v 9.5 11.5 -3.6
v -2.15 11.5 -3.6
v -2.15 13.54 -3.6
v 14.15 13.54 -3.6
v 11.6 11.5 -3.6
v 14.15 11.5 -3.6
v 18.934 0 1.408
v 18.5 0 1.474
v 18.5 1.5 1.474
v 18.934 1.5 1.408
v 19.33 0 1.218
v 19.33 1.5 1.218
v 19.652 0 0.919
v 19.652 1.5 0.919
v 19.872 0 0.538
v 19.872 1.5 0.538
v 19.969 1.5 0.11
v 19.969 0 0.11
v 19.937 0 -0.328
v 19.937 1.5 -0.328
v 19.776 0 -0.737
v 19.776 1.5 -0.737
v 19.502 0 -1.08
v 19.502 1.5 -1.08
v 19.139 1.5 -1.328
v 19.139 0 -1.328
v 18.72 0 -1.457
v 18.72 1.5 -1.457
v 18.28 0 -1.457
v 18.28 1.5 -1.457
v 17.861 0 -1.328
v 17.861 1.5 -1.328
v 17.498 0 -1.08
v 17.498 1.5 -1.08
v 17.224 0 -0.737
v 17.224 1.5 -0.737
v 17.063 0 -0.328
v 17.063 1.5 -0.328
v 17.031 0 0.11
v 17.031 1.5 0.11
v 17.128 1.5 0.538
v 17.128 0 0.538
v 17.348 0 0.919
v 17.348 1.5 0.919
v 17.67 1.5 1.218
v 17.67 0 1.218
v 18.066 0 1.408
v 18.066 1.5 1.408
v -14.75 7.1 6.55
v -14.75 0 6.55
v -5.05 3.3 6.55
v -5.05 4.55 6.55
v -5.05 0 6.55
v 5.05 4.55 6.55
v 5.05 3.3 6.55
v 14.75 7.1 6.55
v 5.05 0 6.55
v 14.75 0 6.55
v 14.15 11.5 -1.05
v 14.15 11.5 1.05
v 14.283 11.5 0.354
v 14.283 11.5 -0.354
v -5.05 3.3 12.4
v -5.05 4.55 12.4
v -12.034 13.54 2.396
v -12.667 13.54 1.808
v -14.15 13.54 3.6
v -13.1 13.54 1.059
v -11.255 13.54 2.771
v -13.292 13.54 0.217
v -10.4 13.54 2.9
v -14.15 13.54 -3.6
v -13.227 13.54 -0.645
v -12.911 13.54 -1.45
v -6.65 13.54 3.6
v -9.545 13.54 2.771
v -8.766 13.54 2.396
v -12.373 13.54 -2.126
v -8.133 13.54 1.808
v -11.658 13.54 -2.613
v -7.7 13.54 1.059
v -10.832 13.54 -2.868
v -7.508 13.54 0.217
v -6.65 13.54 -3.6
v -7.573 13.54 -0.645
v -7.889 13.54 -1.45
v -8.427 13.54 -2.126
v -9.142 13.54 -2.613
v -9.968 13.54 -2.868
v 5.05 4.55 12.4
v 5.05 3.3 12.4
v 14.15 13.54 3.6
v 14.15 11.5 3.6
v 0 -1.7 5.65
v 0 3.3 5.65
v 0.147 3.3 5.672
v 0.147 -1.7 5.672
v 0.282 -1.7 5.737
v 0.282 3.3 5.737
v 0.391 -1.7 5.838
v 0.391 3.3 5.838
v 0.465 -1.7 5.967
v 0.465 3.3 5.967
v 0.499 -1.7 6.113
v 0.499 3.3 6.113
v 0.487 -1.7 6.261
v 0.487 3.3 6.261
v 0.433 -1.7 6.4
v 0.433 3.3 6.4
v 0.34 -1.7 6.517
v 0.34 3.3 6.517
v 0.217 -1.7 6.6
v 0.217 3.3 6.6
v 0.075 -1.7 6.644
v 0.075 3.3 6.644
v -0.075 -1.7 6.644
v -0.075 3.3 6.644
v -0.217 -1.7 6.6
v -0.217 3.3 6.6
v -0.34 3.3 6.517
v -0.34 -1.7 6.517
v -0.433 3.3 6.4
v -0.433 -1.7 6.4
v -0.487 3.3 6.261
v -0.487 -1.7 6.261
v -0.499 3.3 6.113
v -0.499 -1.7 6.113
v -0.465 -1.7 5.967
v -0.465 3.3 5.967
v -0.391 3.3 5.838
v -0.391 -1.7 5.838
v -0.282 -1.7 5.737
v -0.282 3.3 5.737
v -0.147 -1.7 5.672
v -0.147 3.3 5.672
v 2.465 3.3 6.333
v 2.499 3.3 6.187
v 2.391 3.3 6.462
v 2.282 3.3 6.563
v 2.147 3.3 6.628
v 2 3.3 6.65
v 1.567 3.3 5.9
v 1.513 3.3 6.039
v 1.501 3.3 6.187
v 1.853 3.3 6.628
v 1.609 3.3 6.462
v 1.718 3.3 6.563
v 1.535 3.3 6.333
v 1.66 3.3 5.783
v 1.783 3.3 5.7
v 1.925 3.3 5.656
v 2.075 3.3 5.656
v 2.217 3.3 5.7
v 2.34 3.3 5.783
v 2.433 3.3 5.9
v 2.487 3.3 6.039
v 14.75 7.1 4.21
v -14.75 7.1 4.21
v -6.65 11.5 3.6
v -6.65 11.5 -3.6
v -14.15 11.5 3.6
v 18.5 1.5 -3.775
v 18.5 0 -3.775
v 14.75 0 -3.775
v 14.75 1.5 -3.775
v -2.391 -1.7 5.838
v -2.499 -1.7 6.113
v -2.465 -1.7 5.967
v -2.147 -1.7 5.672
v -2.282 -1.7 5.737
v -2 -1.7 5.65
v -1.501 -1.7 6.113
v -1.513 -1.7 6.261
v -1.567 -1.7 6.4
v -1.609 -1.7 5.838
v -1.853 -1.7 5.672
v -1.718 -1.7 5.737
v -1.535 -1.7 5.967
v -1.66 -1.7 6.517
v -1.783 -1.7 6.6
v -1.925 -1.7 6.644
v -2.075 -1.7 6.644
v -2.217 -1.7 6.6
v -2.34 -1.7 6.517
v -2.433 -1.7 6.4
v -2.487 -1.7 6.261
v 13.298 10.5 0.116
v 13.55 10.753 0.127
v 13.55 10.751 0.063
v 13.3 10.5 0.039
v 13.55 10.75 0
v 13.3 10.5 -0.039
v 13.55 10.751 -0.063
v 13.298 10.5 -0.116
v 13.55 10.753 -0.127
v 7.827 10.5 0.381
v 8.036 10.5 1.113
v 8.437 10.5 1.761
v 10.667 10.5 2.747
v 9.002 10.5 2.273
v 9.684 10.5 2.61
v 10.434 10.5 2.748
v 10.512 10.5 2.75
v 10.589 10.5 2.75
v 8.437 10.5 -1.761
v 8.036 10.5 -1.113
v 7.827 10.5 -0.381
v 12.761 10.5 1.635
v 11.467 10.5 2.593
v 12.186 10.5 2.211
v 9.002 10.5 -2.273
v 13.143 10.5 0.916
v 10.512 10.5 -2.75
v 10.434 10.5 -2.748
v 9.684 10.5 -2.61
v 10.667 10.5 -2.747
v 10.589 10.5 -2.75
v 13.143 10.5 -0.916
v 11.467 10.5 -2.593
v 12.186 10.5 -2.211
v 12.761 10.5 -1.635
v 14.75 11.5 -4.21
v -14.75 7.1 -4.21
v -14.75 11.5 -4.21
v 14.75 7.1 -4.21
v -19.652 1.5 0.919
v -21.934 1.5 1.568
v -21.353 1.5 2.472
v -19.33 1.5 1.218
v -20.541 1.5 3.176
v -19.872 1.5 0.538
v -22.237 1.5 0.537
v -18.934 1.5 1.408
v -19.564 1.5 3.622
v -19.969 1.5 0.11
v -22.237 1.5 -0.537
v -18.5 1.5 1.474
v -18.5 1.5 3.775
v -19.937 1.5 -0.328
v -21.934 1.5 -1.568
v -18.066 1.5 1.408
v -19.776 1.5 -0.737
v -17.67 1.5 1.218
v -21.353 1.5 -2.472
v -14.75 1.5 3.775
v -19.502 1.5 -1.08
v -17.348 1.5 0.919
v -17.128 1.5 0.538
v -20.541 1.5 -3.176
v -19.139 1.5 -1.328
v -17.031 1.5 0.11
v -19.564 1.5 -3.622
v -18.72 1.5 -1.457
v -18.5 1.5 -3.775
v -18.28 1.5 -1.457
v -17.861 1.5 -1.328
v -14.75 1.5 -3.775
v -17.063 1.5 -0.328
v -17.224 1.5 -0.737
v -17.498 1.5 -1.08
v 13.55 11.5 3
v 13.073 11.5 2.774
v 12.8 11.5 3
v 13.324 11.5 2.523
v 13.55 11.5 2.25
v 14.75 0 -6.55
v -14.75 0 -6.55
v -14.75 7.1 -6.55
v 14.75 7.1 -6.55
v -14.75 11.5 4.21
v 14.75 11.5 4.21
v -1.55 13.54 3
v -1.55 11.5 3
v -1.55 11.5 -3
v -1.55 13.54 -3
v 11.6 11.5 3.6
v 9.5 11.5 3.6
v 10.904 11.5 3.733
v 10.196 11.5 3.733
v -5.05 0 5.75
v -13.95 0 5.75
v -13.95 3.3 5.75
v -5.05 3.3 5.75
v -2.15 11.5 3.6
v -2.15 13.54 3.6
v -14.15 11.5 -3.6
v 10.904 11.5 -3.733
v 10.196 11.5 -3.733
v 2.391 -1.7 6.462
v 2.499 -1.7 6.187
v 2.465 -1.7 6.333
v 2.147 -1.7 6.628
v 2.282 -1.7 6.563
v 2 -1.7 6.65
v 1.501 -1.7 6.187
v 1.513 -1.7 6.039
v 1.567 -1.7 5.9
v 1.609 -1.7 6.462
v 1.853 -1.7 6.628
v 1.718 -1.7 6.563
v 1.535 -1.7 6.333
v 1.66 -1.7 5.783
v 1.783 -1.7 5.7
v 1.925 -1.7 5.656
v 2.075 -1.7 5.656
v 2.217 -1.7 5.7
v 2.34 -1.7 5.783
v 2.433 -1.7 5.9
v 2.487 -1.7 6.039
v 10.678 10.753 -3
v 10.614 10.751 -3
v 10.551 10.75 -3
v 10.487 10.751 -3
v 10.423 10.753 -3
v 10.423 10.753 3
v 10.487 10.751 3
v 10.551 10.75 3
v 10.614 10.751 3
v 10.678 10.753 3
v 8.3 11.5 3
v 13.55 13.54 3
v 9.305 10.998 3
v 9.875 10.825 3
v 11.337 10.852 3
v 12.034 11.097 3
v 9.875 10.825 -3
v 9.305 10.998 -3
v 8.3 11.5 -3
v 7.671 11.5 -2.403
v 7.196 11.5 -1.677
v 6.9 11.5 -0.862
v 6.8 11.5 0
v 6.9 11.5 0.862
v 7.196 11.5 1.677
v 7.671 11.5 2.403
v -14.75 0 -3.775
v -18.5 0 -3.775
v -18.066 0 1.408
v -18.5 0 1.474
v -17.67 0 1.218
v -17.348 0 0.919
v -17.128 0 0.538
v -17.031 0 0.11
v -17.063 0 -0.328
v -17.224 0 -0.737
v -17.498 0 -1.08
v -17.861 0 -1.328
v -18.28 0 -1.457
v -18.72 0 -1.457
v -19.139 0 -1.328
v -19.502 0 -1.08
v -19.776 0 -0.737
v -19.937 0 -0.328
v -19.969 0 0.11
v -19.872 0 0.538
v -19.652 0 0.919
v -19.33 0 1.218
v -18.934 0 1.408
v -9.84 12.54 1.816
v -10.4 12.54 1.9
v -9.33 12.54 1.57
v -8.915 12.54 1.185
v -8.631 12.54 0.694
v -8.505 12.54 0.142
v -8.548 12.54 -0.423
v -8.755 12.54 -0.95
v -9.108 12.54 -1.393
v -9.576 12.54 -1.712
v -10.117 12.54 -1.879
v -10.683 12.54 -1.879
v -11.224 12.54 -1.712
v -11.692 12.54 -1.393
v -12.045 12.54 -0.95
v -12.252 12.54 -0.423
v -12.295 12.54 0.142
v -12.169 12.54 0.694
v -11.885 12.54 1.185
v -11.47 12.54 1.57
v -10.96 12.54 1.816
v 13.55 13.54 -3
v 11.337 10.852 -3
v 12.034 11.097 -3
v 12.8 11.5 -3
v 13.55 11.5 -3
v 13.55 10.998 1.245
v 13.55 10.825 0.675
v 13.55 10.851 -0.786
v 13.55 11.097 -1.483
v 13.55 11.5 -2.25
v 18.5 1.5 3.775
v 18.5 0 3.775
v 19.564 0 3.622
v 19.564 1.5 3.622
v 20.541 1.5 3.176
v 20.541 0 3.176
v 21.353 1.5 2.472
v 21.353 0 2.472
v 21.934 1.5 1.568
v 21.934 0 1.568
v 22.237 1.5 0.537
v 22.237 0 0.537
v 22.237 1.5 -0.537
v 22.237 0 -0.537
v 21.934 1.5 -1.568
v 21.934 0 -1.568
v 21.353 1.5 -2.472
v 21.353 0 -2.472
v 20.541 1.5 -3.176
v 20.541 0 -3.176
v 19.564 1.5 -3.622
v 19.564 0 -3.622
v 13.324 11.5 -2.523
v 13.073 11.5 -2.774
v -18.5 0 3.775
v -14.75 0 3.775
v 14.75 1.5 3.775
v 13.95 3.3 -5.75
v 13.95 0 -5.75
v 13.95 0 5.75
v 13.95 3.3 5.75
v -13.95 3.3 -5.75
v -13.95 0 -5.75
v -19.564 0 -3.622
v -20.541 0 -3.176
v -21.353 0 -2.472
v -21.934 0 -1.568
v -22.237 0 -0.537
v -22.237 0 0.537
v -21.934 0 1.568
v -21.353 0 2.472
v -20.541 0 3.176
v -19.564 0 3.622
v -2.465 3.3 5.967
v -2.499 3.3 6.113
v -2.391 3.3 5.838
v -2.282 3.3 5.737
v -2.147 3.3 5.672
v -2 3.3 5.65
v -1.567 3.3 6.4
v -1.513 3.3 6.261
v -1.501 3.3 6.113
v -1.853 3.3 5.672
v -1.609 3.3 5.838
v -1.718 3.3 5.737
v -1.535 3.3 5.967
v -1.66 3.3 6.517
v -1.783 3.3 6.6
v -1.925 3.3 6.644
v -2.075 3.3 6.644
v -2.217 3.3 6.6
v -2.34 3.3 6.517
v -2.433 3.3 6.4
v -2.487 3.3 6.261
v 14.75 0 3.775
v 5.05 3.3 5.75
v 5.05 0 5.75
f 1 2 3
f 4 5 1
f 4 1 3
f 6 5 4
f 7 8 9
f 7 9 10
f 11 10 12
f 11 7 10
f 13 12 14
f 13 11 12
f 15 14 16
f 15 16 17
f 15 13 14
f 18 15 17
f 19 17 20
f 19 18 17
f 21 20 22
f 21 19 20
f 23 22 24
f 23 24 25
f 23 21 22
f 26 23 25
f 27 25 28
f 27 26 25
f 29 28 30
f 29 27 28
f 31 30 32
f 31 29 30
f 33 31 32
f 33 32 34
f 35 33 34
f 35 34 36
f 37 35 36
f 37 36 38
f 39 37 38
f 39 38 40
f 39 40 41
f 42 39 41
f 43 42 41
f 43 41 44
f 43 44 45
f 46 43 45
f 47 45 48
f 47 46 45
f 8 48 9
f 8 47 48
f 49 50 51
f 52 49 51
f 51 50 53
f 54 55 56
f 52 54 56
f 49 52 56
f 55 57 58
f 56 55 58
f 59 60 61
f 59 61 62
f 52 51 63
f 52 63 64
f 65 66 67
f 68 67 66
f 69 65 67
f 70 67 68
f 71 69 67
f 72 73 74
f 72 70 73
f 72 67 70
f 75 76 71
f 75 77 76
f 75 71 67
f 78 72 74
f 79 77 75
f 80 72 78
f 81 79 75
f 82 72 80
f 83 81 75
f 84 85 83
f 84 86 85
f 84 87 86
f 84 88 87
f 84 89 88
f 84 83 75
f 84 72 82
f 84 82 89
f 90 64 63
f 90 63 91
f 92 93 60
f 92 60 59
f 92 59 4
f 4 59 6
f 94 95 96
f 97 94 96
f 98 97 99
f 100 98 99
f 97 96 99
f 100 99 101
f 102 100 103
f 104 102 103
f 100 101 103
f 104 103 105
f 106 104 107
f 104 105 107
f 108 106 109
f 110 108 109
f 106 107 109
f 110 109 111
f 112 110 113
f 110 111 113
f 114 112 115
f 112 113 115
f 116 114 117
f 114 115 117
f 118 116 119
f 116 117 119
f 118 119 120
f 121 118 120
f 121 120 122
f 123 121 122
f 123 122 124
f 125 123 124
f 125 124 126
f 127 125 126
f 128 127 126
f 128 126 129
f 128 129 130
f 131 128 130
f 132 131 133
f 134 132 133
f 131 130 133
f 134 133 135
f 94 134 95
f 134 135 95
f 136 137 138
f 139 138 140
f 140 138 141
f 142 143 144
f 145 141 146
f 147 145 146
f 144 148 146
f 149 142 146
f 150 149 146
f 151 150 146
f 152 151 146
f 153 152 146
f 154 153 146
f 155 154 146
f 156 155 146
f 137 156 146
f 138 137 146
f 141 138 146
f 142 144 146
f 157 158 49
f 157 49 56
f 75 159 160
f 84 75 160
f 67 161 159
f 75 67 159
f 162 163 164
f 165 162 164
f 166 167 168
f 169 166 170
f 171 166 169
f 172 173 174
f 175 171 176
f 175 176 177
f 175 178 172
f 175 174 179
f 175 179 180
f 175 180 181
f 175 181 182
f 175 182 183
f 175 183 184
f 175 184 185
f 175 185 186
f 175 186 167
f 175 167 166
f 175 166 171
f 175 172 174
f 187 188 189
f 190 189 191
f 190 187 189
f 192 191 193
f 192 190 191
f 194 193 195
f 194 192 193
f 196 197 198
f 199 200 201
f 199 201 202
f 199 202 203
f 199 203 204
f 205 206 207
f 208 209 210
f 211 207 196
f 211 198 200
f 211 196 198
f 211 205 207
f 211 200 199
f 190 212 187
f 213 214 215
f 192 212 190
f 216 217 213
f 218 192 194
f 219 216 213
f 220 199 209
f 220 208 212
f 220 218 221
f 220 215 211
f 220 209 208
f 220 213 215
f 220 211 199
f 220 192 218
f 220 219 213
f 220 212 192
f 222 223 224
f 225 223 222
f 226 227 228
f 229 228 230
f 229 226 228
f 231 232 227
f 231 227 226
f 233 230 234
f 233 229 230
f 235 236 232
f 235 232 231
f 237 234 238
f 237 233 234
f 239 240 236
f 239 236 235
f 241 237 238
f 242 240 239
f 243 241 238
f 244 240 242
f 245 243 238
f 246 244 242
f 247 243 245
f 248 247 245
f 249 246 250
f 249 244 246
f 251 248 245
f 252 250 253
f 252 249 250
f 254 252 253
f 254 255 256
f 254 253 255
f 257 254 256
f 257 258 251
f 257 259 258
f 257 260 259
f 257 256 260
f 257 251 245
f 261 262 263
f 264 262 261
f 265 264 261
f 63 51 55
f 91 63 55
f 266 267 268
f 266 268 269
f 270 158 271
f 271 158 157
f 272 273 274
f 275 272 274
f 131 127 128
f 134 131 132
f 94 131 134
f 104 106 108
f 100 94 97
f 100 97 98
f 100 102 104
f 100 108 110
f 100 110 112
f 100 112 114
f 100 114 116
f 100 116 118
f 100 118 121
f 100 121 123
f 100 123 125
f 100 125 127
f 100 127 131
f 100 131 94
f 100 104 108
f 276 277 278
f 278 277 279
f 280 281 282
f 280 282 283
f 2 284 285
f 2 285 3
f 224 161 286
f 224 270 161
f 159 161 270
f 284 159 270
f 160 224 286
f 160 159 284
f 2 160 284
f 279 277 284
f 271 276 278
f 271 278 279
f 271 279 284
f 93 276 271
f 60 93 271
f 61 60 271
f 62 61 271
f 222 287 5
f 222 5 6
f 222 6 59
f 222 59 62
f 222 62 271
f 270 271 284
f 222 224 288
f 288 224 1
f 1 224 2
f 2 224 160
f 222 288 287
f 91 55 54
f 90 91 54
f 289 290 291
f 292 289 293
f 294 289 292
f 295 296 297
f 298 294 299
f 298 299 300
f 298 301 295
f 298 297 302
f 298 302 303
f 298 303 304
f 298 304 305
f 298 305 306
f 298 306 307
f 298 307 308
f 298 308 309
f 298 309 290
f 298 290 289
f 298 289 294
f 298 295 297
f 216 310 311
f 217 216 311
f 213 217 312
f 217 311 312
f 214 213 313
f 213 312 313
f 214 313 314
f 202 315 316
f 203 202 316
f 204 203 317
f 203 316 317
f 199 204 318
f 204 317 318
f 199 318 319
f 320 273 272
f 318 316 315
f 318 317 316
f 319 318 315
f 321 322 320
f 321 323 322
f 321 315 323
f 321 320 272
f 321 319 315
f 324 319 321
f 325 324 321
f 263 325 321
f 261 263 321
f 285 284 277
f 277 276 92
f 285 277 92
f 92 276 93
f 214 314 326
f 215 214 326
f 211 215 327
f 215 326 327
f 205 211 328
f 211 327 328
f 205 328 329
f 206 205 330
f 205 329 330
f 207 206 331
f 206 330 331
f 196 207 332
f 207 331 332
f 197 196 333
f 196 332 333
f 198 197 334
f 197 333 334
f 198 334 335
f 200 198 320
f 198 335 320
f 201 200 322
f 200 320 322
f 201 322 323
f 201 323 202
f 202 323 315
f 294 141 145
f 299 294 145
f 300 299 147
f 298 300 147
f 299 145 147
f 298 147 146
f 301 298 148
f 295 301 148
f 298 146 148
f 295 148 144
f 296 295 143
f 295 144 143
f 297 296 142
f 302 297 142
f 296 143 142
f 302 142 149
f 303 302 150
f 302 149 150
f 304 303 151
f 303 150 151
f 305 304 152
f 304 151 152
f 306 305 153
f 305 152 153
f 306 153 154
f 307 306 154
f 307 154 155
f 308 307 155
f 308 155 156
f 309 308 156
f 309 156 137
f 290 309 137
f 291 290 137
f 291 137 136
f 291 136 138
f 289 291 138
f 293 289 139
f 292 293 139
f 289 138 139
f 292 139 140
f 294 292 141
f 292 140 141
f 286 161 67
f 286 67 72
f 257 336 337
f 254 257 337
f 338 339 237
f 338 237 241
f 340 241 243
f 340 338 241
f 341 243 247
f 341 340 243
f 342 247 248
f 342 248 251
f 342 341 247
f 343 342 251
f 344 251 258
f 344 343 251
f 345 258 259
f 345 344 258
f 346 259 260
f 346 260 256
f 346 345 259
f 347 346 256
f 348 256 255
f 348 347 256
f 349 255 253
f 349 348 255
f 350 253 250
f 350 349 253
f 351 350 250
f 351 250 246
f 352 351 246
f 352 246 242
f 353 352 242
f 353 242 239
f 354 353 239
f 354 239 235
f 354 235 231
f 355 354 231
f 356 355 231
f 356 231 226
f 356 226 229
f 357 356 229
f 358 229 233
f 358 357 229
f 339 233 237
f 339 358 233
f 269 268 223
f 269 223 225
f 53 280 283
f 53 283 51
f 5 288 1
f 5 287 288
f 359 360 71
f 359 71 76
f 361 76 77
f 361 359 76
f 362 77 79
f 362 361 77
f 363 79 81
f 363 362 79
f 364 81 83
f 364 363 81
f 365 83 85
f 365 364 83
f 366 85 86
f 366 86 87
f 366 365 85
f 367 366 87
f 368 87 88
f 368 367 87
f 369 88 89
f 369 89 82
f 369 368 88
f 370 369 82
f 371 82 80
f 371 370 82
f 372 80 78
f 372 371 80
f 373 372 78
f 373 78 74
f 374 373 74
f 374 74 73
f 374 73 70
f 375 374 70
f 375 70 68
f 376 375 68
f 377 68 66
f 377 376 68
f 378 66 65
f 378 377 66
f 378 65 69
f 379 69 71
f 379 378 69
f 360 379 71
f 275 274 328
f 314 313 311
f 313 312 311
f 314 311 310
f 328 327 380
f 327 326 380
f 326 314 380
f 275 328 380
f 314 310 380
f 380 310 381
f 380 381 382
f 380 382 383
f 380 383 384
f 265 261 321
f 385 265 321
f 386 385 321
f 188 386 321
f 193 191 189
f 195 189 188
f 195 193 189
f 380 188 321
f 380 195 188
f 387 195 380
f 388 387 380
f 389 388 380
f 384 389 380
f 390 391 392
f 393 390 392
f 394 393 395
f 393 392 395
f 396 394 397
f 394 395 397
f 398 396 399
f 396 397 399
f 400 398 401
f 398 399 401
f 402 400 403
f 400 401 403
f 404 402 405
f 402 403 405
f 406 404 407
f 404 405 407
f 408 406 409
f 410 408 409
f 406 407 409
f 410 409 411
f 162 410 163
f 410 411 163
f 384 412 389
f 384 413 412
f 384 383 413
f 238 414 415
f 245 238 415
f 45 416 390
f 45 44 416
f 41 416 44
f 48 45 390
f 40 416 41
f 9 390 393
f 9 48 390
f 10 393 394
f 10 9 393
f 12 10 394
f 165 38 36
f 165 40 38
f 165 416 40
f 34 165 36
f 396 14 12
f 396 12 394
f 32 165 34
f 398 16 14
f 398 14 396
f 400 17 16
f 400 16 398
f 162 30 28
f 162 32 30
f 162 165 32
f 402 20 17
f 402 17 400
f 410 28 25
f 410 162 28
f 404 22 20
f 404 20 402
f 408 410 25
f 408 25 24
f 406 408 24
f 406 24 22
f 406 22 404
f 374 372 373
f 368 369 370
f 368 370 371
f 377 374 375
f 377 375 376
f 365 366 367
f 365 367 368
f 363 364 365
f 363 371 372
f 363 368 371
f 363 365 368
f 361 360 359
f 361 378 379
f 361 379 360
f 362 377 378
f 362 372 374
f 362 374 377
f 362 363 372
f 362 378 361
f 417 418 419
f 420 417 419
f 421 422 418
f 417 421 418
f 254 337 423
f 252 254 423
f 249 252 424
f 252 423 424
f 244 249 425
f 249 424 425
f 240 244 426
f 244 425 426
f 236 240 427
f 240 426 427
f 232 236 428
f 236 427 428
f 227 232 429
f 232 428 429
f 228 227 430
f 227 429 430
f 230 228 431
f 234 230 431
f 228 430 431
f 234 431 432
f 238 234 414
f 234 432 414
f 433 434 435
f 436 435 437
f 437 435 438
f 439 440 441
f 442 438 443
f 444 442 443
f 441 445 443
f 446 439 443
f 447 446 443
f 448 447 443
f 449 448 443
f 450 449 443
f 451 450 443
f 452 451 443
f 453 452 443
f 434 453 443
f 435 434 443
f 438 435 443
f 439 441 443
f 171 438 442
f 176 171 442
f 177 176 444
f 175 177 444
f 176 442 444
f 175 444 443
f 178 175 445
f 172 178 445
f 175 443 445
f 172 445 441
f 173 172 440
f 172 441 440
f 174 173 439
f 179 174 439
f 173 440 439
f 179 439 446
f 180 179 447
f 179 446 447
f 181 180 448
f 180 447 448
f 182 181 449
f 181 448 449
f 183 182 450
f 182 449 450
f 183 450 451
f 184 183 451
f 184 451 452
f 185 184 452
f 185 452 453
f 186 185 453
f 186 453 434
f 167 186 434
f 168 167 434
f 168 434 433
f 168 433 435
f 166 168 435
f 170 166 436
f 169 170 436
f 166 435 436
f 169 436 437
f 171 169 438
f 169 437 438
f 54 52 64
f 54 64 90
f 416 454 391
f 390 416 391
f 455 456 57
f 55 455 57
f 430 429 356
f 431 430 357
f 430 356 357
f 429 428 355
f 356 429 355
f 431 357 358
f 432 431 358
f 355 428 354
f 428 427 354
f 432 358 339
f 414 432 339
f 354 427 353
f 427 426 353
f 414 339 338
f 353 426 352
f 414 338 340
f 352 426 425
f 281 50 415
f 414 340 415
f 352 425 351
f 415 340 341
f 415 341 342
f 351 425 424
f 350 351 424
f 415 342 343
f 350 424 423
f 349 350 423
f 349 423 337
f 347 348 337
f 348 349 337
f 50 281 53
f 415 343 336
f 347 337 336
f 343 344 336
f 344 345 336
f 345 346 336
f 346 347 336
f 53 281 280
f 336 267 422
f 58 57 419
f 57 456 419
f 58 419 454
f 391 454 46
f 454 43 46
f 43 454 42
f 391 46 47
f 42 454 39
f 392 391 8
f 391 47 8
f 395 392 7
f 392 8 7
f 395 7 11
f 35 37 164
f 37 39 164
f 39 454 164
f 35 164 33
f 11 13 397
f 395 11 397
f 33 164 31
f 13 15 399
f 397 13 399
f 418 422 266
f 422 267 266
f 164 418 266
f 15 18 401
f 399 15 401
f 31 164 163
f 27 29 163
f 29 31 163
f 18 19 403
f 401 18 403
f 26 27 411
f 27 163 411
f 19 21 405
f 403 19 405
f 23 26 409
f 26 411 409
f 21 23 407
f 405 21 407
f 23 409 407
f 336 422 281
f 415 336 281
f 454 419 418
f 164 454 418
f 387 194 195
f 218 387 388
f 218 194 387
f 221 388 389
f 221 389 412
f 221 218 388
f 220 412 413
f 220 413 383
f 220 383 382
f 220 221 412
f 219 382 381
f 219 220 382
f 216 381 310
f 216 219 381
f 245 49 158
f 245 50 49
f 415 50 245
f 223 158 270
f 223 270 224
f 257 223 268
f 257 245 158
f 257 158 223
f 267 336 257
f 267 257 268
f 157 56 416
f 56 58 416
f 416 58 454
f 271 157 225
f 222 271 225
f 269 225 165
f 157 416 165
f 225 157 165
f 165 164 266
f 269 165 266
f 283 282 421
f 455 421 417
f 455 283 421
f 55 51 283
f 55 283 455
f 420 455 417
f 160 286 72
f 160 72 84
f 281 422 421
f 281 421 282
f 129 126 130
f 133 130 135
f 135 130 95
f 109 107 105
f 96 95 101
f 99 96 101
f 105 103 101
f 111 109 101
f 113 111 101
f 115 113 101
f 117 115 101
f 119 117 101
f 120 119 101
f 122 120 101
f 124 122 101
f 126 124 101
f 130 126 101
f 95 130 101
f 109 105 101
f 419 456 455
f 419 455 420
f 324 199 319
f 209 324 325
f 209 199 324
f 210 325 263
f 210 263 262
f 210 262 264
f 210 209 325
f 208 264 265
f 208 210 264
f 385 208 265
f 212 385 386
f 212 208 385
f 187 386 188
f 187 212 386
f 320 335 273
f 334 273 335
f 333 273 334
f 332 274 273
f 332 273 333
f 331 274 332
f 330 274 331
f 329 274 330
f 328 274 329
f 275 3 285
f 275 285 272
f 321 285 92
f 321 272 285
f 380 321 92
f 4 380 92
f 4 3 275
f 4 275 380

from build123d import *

# Parameters (mm, degrees)
SKETCH1_R             = 1.473596517
BOSS_EXTRUDE1_DEPTH   = 1.5
SKETCH2_W             = 29.5
SKETCH2_H             = 13.1
BOSS_EXTRUDE2_DEPTH   = 5.6
SKETCH3_W             = 29.5
SKETCH3_H             = 8.42
BOSS_EXTRUDE3_DEPTH   = 4.4
SKETCH4_W             = 7.5
SKETCH4_H             = 7.2
SKETCH4_W_2           = 16.3
SKETCH4_W_3           = 15.1
SKETCH4_H_2           = 6
BOSS_EXTRUDE4_DEPTH   = 2.04
SKETCH5_R             = 2.9
CUT_EXTRUDE1_DEPTH    = 1
CUT_EXTRUDE2_DEPTH    = 1
CHAMFER1_SIZE         = 1
SKETCH7_W             = 10.1
SKETCH7_H             = 1.25
BOSS_EXTRUDE5_DEPTH   = 5.85
SKETCH8_W             = 27.9
SKETCH8_H             = 11.5
SKETCH8_W_2           = 10.1
SKETCH8_H_2           = 0.8
CUT_EXTRUDE3_DEPTH    = 3.3
SKETCH9_R             = 0.5
BOSS_EXTRUDE6_DEPTH   = 5
BOSS_EXTRUDE6_2_DEPTH = 5
BOSS_EXTRUDE6_3_DEPTH = 5


with BuildPart() as part:
    # Sketch1 → Boss-Extrude1 (new body)
    with BuildSketch(Plane(origin=(0, 0, 0), x_dir=(1, 0, 0), z_dir=(0, 1, 0))):
        with BuildLine():
            Line((14.75, -6.55), (14.75, -3.775))
            Line((14.75, -3.775), (18.5, -3.775))
            ThreePointArc((18.5, -3.775), (22.275, 0), (18.5, 3.775))
            Line((18.5, 3.775), (14.75, 3.775))
            Line((14.75, 3.775), (14.75, 6.55))
            Line((14.75, 6.55), (-14.75, 6.55))
            Line((-14.75, 6.55), (-14.75, 3.775))
            Line((-14.75, 3.775), (-18.5, 3.775))
            ThreePointArc((-18.5, 3.775), (-22.275, 0), (-18.5, -3.775))
            Line((-18.5, -3.775), (-14.75, -3.775))
            Line((-14.75, -3.775), (-14.75, -6.55))
            Line((-14.75, -6.55), (14.75, -6.55))
        make_face()
        with Locations(Location((-18.5, 0, 0), (0, 0, 270))):
            Circle(SKETCH1_R, mode=Mode.SUBTRACT)
        with Locations(Location((18.5, 0, 0), (0, 0, 270))):
            Circle(SKETCH1_R, mode=Mode.SUBTRACT)
    extrude(amount=BOSS_EXTRUDE1_DEPTH)

    # Sketch2 → Boss-Extrude2 (add)
    with BuildSketch(Plane(origin=(0, 1.5, 0), x_dir=(1, 0, 0), z_dir=(0, 1, 0))):
        Rectangle(SKETCH2_W, SKETCH2_H)
    extrude(amount=BOSS_EXTRUDE2_DEPTH)

    # Sketch3 → Boss-Extrude3 (add)
    with BuildSketch(Plane(origin=(0, 7.1, 0), x_dir=(1, 0, 0), z_dir=(0, 1, 0))):
        Rectangle(SKETCH3_W, SKETCH3_H)
    extrude(amount=BOSS_EXTRUDE3_DEPTH)

    # Sketch4 → Boss-Extrude4 (add)
    # profile 1 of 2: a face of its own
    with BuildSketch(Plane(origin=(0, 11.5, 0), x_dir=(1, 0, 0), z_dir=(0, 1, 0))):
        with Locations((-10.4, 0)):
            Rectangle(SKETCH4_W, SKETCH4_H)
    # profile 2 of 2: a face of its own
    with BuildSketch(Plane(origin=(0, 11.5, 0), x_dir=(1, 0, 0), z_dir=(0, 1, 0))):
        with Locations((6, 0)):
            Rectangle(SKETCH4_W_2, SKETCH4_H)
        with Locations((6, 0)):
            Rectangle(SKETCH4_W_3, SKETCH4_H_2, mode=Mode.SUBTRACT)
    extrude(amount=BOSS_EXTRUDE4_DEPTH)

    # Sketch5 → Cut-Extrude1 (cut)
    with BuildSketch(Plane(origin=(0, 13.54, 0), x_dir=(1, 0, 0), z_dir=(0, 1, 0))):
        with Locations(Location((-10.4, 0, 0), (0, 0, 270))):
            Circle(SKETCH5_R)
    extrude(amount=-CUT_EXTRUDE1_DEPTH, mode=Mode.SUBTRACT)

    # Sketch6 → Cut-Extrude2 (cut)
    with BuildSketch(Plane(origin=(0, 11.5, 0), x_dir=(1, 0, 0), z_dir=(0, 1, 0))):
        with BuildLine():
            ThreePointArc((8.3, 3), (7.195898034, 1.677050983), (6.8, 0))
            Line((6.8, 0), (13.55, 0))
            Line((13.55, 0), (13.55, 2.25))
            ThreePointArc((13.55, 2.25), (13.201650429, 2.651650429), (12.8, 3))
            Line((12.8, 3), (8.3, 3))
        make_face()
        with BuildLine():
            Line((13.55, 0), (6.8, 0))
            ThreePointArc((6.8, 0), (7.195898034, -1.677050983), (8.3, -3))
            Line((8.3, -3), (12.8, -3))
            ThreePointArc((12.8, -3), (13.201650429, -2.651650429), (13.55, -2.25))
            Line((13.55, -2.25), (13.55, 0))
        make_face()
    extrude(amount=-CUT_EXTRUDE2_DEPTH, mode=Mode.SUBTRACT)

    # Chamfer1
    # the kernel refuses this chamfer: 1 mm, written as the material it adds along each edge
    with BuildSketch(Plane(origin=(-10.4, 12.54, 0), x_dir=(0, 0, 1), z_dir=(-1, 0, 0))) as chamfer1_piece_1_section:
        Polygon((2.9, CHAMFER1_SIZE), (2.9 - CHAMFER1_SIZE, 0), (2.9, 0), align=None)
    chamfer1_piece_1 = revolve(axis=Axis((-10.4, 12.54, 0), (0, 1, 0)), mode=Mode.PRIVATE)
    chamfer1_piece_1 = split(chamfer1_piece_1, bisect_by=Plane(origin=(-10.4, 13.54, -2.40049425), z_dir=(0, -1, 0)), keep=Keep.TOP, mode=Mode.PRIVATE)
    add(chamfer1_piece_1)
    with BuildSketch(Plane(origin=(10.55, 10.5, 0), x_dir=(0.04265214044718796, 0, -0.9990899833925238), z_dir=(0.9990899833925238, 0, 0.04265214044718796))) as chamfer1_piece_2_section:
        Polygon((3.75 - CHAMFER1_SIZE, 0), (3.75, CHAMFER1_SIZE), (3.75, 0), align=None)
    chamfer1_piece_2 = revolve(axis=Axis((10.55, 10.5, 0), (0, 1, 0)), revolution_arc=184.889058401, mode=Mode.PRIVATE)
    chamfer1_piece_2 = split(chamfer1_piece_2, bisect_by=Plane(origin=(7.302801052, 11.5, 0), z_dir=(0, -1, 0)), keep=Keep.TOP, mode=Mode.PRIVATE)
    add(chamfer1_piece_2)
    with BuildSketch(Plane(origin=(10.55, 10.5, 0), x_dir=(0.999105910747441, 0, 0.04227740660833228), z_dir=(-0.04227740660833228, 0, 0.999105910747441))) as chamfer1_piece_3_section:
        Polygon((3.75, CHAMFER1_SIZE), (3.75 - CHAMFER1_SIZE, 0), (3.75, 0), align=None)
    chamfer1_piece_3 = revolve(axis=Axis((10.55, 10.5, 0), (0, 1, 0)), revolution_arc=94.846078296, mode=Mode.PRIVATE)
    chamfer1_piece_3 = split(chamfer1_piece_3, bisect_by=Plane(origin=(13.908005582, 11.5, -0.857414342), z_dir=(0, -1, 0)), keep=Keep.TOP, mode=Mode.PRIVATE)
    add(chamfer1_piece_3)
    with BuildSketch(Plane(origin=(10.55, 10.5, 0), x_dir=(-0.04227740660831898, 0, 0.9991059107474417), z_dir=(-0.9991059107474417, 0, -0.04227740660831898))) as chamfer1_piece_4_section:
        Polygon((3.75, CHAMFER1_SIZE), (3.75 - CHAMFER1_SIZE, 0), (3.75, 0), align=None)
    chamfer1_piece_4 = revolve(axis=Axis((10.55, 10.5, 0), (0, 1, 0)), revolution_arc=94.846078296, mode=Mode.PRIVATE)
    chamfer1_piece_4 = split(chamfer1_piece_4, bisect_by=Plane(origin=(11.407414343, 11.5, 3.358005582), z_dir=(0, -1, 0)), keep=Keep.TOP, mode=Mode.PRIVATE)
    add(chamfer1_piece_4)

    # Sketch7 → Boss-Extrude5 (add)
    with BuildSketch(Plane.XY.offset(6.55)):
        with Locations((0, 3.925)):
            Rectangle(SKETCH7_W, SKETCH7_H)
    extrude(amount=BOSS_EXTRUDE5_DEPTH)

    # Sketch8 → Cut-Extrude3 (cut)
    with BuildSketch(Plane.XZ):
        Rectangle(SKETCH8_W, SKETCH8_H)
        with Locations((0, 6.15)):
            Rectangle(SKETCH8_W_2, SKETCH8_H_2)
    extrude(amount=-CUT_EXTRUDE3_DEPTH, mode=Mode.SUBTRACT)


with BuildPart() as body_2:
    # Sketch9 → Boss-Extrude6 (new body)
    with BuildSketch(Plane.XZ.offset(-3.3)):
        with Locations(Location((0, 6.15, 0), (0, 0, 270))):
            Circle(SKETCH9_R)
    extrude(amount=BOSS_EXTRUDE6_DEPTH)


with BuildPart() as body_3:
    # Sketch9 → Boss-Extrude6 2 (new body)
    with BuildSketch(Plane.XZ.offset(-3.3)):
        with Locations(Location((-2, 6.15, 0), (0, 0, 270))):
            Circle(SKETCH9_R)
    extrude(amount=BOSS_EXTRUDE6_2_DEPTH)


with BuildPart() as body_4:
    # Sketch9 → Boss-Extrude6 3 (new body)
    with BuildSketch(Plane.XZ.offset(-3.3)):
        with Locations(Location((2, 6.15, 0), (0, 0, 90))):
            Circle(SKETCH9_R)
    extrude(amount=BOSS_EXTRUDE6_3_DEPTH)


solid = Compound([part.part, body_2.part, body_3.part, body_4.part])
